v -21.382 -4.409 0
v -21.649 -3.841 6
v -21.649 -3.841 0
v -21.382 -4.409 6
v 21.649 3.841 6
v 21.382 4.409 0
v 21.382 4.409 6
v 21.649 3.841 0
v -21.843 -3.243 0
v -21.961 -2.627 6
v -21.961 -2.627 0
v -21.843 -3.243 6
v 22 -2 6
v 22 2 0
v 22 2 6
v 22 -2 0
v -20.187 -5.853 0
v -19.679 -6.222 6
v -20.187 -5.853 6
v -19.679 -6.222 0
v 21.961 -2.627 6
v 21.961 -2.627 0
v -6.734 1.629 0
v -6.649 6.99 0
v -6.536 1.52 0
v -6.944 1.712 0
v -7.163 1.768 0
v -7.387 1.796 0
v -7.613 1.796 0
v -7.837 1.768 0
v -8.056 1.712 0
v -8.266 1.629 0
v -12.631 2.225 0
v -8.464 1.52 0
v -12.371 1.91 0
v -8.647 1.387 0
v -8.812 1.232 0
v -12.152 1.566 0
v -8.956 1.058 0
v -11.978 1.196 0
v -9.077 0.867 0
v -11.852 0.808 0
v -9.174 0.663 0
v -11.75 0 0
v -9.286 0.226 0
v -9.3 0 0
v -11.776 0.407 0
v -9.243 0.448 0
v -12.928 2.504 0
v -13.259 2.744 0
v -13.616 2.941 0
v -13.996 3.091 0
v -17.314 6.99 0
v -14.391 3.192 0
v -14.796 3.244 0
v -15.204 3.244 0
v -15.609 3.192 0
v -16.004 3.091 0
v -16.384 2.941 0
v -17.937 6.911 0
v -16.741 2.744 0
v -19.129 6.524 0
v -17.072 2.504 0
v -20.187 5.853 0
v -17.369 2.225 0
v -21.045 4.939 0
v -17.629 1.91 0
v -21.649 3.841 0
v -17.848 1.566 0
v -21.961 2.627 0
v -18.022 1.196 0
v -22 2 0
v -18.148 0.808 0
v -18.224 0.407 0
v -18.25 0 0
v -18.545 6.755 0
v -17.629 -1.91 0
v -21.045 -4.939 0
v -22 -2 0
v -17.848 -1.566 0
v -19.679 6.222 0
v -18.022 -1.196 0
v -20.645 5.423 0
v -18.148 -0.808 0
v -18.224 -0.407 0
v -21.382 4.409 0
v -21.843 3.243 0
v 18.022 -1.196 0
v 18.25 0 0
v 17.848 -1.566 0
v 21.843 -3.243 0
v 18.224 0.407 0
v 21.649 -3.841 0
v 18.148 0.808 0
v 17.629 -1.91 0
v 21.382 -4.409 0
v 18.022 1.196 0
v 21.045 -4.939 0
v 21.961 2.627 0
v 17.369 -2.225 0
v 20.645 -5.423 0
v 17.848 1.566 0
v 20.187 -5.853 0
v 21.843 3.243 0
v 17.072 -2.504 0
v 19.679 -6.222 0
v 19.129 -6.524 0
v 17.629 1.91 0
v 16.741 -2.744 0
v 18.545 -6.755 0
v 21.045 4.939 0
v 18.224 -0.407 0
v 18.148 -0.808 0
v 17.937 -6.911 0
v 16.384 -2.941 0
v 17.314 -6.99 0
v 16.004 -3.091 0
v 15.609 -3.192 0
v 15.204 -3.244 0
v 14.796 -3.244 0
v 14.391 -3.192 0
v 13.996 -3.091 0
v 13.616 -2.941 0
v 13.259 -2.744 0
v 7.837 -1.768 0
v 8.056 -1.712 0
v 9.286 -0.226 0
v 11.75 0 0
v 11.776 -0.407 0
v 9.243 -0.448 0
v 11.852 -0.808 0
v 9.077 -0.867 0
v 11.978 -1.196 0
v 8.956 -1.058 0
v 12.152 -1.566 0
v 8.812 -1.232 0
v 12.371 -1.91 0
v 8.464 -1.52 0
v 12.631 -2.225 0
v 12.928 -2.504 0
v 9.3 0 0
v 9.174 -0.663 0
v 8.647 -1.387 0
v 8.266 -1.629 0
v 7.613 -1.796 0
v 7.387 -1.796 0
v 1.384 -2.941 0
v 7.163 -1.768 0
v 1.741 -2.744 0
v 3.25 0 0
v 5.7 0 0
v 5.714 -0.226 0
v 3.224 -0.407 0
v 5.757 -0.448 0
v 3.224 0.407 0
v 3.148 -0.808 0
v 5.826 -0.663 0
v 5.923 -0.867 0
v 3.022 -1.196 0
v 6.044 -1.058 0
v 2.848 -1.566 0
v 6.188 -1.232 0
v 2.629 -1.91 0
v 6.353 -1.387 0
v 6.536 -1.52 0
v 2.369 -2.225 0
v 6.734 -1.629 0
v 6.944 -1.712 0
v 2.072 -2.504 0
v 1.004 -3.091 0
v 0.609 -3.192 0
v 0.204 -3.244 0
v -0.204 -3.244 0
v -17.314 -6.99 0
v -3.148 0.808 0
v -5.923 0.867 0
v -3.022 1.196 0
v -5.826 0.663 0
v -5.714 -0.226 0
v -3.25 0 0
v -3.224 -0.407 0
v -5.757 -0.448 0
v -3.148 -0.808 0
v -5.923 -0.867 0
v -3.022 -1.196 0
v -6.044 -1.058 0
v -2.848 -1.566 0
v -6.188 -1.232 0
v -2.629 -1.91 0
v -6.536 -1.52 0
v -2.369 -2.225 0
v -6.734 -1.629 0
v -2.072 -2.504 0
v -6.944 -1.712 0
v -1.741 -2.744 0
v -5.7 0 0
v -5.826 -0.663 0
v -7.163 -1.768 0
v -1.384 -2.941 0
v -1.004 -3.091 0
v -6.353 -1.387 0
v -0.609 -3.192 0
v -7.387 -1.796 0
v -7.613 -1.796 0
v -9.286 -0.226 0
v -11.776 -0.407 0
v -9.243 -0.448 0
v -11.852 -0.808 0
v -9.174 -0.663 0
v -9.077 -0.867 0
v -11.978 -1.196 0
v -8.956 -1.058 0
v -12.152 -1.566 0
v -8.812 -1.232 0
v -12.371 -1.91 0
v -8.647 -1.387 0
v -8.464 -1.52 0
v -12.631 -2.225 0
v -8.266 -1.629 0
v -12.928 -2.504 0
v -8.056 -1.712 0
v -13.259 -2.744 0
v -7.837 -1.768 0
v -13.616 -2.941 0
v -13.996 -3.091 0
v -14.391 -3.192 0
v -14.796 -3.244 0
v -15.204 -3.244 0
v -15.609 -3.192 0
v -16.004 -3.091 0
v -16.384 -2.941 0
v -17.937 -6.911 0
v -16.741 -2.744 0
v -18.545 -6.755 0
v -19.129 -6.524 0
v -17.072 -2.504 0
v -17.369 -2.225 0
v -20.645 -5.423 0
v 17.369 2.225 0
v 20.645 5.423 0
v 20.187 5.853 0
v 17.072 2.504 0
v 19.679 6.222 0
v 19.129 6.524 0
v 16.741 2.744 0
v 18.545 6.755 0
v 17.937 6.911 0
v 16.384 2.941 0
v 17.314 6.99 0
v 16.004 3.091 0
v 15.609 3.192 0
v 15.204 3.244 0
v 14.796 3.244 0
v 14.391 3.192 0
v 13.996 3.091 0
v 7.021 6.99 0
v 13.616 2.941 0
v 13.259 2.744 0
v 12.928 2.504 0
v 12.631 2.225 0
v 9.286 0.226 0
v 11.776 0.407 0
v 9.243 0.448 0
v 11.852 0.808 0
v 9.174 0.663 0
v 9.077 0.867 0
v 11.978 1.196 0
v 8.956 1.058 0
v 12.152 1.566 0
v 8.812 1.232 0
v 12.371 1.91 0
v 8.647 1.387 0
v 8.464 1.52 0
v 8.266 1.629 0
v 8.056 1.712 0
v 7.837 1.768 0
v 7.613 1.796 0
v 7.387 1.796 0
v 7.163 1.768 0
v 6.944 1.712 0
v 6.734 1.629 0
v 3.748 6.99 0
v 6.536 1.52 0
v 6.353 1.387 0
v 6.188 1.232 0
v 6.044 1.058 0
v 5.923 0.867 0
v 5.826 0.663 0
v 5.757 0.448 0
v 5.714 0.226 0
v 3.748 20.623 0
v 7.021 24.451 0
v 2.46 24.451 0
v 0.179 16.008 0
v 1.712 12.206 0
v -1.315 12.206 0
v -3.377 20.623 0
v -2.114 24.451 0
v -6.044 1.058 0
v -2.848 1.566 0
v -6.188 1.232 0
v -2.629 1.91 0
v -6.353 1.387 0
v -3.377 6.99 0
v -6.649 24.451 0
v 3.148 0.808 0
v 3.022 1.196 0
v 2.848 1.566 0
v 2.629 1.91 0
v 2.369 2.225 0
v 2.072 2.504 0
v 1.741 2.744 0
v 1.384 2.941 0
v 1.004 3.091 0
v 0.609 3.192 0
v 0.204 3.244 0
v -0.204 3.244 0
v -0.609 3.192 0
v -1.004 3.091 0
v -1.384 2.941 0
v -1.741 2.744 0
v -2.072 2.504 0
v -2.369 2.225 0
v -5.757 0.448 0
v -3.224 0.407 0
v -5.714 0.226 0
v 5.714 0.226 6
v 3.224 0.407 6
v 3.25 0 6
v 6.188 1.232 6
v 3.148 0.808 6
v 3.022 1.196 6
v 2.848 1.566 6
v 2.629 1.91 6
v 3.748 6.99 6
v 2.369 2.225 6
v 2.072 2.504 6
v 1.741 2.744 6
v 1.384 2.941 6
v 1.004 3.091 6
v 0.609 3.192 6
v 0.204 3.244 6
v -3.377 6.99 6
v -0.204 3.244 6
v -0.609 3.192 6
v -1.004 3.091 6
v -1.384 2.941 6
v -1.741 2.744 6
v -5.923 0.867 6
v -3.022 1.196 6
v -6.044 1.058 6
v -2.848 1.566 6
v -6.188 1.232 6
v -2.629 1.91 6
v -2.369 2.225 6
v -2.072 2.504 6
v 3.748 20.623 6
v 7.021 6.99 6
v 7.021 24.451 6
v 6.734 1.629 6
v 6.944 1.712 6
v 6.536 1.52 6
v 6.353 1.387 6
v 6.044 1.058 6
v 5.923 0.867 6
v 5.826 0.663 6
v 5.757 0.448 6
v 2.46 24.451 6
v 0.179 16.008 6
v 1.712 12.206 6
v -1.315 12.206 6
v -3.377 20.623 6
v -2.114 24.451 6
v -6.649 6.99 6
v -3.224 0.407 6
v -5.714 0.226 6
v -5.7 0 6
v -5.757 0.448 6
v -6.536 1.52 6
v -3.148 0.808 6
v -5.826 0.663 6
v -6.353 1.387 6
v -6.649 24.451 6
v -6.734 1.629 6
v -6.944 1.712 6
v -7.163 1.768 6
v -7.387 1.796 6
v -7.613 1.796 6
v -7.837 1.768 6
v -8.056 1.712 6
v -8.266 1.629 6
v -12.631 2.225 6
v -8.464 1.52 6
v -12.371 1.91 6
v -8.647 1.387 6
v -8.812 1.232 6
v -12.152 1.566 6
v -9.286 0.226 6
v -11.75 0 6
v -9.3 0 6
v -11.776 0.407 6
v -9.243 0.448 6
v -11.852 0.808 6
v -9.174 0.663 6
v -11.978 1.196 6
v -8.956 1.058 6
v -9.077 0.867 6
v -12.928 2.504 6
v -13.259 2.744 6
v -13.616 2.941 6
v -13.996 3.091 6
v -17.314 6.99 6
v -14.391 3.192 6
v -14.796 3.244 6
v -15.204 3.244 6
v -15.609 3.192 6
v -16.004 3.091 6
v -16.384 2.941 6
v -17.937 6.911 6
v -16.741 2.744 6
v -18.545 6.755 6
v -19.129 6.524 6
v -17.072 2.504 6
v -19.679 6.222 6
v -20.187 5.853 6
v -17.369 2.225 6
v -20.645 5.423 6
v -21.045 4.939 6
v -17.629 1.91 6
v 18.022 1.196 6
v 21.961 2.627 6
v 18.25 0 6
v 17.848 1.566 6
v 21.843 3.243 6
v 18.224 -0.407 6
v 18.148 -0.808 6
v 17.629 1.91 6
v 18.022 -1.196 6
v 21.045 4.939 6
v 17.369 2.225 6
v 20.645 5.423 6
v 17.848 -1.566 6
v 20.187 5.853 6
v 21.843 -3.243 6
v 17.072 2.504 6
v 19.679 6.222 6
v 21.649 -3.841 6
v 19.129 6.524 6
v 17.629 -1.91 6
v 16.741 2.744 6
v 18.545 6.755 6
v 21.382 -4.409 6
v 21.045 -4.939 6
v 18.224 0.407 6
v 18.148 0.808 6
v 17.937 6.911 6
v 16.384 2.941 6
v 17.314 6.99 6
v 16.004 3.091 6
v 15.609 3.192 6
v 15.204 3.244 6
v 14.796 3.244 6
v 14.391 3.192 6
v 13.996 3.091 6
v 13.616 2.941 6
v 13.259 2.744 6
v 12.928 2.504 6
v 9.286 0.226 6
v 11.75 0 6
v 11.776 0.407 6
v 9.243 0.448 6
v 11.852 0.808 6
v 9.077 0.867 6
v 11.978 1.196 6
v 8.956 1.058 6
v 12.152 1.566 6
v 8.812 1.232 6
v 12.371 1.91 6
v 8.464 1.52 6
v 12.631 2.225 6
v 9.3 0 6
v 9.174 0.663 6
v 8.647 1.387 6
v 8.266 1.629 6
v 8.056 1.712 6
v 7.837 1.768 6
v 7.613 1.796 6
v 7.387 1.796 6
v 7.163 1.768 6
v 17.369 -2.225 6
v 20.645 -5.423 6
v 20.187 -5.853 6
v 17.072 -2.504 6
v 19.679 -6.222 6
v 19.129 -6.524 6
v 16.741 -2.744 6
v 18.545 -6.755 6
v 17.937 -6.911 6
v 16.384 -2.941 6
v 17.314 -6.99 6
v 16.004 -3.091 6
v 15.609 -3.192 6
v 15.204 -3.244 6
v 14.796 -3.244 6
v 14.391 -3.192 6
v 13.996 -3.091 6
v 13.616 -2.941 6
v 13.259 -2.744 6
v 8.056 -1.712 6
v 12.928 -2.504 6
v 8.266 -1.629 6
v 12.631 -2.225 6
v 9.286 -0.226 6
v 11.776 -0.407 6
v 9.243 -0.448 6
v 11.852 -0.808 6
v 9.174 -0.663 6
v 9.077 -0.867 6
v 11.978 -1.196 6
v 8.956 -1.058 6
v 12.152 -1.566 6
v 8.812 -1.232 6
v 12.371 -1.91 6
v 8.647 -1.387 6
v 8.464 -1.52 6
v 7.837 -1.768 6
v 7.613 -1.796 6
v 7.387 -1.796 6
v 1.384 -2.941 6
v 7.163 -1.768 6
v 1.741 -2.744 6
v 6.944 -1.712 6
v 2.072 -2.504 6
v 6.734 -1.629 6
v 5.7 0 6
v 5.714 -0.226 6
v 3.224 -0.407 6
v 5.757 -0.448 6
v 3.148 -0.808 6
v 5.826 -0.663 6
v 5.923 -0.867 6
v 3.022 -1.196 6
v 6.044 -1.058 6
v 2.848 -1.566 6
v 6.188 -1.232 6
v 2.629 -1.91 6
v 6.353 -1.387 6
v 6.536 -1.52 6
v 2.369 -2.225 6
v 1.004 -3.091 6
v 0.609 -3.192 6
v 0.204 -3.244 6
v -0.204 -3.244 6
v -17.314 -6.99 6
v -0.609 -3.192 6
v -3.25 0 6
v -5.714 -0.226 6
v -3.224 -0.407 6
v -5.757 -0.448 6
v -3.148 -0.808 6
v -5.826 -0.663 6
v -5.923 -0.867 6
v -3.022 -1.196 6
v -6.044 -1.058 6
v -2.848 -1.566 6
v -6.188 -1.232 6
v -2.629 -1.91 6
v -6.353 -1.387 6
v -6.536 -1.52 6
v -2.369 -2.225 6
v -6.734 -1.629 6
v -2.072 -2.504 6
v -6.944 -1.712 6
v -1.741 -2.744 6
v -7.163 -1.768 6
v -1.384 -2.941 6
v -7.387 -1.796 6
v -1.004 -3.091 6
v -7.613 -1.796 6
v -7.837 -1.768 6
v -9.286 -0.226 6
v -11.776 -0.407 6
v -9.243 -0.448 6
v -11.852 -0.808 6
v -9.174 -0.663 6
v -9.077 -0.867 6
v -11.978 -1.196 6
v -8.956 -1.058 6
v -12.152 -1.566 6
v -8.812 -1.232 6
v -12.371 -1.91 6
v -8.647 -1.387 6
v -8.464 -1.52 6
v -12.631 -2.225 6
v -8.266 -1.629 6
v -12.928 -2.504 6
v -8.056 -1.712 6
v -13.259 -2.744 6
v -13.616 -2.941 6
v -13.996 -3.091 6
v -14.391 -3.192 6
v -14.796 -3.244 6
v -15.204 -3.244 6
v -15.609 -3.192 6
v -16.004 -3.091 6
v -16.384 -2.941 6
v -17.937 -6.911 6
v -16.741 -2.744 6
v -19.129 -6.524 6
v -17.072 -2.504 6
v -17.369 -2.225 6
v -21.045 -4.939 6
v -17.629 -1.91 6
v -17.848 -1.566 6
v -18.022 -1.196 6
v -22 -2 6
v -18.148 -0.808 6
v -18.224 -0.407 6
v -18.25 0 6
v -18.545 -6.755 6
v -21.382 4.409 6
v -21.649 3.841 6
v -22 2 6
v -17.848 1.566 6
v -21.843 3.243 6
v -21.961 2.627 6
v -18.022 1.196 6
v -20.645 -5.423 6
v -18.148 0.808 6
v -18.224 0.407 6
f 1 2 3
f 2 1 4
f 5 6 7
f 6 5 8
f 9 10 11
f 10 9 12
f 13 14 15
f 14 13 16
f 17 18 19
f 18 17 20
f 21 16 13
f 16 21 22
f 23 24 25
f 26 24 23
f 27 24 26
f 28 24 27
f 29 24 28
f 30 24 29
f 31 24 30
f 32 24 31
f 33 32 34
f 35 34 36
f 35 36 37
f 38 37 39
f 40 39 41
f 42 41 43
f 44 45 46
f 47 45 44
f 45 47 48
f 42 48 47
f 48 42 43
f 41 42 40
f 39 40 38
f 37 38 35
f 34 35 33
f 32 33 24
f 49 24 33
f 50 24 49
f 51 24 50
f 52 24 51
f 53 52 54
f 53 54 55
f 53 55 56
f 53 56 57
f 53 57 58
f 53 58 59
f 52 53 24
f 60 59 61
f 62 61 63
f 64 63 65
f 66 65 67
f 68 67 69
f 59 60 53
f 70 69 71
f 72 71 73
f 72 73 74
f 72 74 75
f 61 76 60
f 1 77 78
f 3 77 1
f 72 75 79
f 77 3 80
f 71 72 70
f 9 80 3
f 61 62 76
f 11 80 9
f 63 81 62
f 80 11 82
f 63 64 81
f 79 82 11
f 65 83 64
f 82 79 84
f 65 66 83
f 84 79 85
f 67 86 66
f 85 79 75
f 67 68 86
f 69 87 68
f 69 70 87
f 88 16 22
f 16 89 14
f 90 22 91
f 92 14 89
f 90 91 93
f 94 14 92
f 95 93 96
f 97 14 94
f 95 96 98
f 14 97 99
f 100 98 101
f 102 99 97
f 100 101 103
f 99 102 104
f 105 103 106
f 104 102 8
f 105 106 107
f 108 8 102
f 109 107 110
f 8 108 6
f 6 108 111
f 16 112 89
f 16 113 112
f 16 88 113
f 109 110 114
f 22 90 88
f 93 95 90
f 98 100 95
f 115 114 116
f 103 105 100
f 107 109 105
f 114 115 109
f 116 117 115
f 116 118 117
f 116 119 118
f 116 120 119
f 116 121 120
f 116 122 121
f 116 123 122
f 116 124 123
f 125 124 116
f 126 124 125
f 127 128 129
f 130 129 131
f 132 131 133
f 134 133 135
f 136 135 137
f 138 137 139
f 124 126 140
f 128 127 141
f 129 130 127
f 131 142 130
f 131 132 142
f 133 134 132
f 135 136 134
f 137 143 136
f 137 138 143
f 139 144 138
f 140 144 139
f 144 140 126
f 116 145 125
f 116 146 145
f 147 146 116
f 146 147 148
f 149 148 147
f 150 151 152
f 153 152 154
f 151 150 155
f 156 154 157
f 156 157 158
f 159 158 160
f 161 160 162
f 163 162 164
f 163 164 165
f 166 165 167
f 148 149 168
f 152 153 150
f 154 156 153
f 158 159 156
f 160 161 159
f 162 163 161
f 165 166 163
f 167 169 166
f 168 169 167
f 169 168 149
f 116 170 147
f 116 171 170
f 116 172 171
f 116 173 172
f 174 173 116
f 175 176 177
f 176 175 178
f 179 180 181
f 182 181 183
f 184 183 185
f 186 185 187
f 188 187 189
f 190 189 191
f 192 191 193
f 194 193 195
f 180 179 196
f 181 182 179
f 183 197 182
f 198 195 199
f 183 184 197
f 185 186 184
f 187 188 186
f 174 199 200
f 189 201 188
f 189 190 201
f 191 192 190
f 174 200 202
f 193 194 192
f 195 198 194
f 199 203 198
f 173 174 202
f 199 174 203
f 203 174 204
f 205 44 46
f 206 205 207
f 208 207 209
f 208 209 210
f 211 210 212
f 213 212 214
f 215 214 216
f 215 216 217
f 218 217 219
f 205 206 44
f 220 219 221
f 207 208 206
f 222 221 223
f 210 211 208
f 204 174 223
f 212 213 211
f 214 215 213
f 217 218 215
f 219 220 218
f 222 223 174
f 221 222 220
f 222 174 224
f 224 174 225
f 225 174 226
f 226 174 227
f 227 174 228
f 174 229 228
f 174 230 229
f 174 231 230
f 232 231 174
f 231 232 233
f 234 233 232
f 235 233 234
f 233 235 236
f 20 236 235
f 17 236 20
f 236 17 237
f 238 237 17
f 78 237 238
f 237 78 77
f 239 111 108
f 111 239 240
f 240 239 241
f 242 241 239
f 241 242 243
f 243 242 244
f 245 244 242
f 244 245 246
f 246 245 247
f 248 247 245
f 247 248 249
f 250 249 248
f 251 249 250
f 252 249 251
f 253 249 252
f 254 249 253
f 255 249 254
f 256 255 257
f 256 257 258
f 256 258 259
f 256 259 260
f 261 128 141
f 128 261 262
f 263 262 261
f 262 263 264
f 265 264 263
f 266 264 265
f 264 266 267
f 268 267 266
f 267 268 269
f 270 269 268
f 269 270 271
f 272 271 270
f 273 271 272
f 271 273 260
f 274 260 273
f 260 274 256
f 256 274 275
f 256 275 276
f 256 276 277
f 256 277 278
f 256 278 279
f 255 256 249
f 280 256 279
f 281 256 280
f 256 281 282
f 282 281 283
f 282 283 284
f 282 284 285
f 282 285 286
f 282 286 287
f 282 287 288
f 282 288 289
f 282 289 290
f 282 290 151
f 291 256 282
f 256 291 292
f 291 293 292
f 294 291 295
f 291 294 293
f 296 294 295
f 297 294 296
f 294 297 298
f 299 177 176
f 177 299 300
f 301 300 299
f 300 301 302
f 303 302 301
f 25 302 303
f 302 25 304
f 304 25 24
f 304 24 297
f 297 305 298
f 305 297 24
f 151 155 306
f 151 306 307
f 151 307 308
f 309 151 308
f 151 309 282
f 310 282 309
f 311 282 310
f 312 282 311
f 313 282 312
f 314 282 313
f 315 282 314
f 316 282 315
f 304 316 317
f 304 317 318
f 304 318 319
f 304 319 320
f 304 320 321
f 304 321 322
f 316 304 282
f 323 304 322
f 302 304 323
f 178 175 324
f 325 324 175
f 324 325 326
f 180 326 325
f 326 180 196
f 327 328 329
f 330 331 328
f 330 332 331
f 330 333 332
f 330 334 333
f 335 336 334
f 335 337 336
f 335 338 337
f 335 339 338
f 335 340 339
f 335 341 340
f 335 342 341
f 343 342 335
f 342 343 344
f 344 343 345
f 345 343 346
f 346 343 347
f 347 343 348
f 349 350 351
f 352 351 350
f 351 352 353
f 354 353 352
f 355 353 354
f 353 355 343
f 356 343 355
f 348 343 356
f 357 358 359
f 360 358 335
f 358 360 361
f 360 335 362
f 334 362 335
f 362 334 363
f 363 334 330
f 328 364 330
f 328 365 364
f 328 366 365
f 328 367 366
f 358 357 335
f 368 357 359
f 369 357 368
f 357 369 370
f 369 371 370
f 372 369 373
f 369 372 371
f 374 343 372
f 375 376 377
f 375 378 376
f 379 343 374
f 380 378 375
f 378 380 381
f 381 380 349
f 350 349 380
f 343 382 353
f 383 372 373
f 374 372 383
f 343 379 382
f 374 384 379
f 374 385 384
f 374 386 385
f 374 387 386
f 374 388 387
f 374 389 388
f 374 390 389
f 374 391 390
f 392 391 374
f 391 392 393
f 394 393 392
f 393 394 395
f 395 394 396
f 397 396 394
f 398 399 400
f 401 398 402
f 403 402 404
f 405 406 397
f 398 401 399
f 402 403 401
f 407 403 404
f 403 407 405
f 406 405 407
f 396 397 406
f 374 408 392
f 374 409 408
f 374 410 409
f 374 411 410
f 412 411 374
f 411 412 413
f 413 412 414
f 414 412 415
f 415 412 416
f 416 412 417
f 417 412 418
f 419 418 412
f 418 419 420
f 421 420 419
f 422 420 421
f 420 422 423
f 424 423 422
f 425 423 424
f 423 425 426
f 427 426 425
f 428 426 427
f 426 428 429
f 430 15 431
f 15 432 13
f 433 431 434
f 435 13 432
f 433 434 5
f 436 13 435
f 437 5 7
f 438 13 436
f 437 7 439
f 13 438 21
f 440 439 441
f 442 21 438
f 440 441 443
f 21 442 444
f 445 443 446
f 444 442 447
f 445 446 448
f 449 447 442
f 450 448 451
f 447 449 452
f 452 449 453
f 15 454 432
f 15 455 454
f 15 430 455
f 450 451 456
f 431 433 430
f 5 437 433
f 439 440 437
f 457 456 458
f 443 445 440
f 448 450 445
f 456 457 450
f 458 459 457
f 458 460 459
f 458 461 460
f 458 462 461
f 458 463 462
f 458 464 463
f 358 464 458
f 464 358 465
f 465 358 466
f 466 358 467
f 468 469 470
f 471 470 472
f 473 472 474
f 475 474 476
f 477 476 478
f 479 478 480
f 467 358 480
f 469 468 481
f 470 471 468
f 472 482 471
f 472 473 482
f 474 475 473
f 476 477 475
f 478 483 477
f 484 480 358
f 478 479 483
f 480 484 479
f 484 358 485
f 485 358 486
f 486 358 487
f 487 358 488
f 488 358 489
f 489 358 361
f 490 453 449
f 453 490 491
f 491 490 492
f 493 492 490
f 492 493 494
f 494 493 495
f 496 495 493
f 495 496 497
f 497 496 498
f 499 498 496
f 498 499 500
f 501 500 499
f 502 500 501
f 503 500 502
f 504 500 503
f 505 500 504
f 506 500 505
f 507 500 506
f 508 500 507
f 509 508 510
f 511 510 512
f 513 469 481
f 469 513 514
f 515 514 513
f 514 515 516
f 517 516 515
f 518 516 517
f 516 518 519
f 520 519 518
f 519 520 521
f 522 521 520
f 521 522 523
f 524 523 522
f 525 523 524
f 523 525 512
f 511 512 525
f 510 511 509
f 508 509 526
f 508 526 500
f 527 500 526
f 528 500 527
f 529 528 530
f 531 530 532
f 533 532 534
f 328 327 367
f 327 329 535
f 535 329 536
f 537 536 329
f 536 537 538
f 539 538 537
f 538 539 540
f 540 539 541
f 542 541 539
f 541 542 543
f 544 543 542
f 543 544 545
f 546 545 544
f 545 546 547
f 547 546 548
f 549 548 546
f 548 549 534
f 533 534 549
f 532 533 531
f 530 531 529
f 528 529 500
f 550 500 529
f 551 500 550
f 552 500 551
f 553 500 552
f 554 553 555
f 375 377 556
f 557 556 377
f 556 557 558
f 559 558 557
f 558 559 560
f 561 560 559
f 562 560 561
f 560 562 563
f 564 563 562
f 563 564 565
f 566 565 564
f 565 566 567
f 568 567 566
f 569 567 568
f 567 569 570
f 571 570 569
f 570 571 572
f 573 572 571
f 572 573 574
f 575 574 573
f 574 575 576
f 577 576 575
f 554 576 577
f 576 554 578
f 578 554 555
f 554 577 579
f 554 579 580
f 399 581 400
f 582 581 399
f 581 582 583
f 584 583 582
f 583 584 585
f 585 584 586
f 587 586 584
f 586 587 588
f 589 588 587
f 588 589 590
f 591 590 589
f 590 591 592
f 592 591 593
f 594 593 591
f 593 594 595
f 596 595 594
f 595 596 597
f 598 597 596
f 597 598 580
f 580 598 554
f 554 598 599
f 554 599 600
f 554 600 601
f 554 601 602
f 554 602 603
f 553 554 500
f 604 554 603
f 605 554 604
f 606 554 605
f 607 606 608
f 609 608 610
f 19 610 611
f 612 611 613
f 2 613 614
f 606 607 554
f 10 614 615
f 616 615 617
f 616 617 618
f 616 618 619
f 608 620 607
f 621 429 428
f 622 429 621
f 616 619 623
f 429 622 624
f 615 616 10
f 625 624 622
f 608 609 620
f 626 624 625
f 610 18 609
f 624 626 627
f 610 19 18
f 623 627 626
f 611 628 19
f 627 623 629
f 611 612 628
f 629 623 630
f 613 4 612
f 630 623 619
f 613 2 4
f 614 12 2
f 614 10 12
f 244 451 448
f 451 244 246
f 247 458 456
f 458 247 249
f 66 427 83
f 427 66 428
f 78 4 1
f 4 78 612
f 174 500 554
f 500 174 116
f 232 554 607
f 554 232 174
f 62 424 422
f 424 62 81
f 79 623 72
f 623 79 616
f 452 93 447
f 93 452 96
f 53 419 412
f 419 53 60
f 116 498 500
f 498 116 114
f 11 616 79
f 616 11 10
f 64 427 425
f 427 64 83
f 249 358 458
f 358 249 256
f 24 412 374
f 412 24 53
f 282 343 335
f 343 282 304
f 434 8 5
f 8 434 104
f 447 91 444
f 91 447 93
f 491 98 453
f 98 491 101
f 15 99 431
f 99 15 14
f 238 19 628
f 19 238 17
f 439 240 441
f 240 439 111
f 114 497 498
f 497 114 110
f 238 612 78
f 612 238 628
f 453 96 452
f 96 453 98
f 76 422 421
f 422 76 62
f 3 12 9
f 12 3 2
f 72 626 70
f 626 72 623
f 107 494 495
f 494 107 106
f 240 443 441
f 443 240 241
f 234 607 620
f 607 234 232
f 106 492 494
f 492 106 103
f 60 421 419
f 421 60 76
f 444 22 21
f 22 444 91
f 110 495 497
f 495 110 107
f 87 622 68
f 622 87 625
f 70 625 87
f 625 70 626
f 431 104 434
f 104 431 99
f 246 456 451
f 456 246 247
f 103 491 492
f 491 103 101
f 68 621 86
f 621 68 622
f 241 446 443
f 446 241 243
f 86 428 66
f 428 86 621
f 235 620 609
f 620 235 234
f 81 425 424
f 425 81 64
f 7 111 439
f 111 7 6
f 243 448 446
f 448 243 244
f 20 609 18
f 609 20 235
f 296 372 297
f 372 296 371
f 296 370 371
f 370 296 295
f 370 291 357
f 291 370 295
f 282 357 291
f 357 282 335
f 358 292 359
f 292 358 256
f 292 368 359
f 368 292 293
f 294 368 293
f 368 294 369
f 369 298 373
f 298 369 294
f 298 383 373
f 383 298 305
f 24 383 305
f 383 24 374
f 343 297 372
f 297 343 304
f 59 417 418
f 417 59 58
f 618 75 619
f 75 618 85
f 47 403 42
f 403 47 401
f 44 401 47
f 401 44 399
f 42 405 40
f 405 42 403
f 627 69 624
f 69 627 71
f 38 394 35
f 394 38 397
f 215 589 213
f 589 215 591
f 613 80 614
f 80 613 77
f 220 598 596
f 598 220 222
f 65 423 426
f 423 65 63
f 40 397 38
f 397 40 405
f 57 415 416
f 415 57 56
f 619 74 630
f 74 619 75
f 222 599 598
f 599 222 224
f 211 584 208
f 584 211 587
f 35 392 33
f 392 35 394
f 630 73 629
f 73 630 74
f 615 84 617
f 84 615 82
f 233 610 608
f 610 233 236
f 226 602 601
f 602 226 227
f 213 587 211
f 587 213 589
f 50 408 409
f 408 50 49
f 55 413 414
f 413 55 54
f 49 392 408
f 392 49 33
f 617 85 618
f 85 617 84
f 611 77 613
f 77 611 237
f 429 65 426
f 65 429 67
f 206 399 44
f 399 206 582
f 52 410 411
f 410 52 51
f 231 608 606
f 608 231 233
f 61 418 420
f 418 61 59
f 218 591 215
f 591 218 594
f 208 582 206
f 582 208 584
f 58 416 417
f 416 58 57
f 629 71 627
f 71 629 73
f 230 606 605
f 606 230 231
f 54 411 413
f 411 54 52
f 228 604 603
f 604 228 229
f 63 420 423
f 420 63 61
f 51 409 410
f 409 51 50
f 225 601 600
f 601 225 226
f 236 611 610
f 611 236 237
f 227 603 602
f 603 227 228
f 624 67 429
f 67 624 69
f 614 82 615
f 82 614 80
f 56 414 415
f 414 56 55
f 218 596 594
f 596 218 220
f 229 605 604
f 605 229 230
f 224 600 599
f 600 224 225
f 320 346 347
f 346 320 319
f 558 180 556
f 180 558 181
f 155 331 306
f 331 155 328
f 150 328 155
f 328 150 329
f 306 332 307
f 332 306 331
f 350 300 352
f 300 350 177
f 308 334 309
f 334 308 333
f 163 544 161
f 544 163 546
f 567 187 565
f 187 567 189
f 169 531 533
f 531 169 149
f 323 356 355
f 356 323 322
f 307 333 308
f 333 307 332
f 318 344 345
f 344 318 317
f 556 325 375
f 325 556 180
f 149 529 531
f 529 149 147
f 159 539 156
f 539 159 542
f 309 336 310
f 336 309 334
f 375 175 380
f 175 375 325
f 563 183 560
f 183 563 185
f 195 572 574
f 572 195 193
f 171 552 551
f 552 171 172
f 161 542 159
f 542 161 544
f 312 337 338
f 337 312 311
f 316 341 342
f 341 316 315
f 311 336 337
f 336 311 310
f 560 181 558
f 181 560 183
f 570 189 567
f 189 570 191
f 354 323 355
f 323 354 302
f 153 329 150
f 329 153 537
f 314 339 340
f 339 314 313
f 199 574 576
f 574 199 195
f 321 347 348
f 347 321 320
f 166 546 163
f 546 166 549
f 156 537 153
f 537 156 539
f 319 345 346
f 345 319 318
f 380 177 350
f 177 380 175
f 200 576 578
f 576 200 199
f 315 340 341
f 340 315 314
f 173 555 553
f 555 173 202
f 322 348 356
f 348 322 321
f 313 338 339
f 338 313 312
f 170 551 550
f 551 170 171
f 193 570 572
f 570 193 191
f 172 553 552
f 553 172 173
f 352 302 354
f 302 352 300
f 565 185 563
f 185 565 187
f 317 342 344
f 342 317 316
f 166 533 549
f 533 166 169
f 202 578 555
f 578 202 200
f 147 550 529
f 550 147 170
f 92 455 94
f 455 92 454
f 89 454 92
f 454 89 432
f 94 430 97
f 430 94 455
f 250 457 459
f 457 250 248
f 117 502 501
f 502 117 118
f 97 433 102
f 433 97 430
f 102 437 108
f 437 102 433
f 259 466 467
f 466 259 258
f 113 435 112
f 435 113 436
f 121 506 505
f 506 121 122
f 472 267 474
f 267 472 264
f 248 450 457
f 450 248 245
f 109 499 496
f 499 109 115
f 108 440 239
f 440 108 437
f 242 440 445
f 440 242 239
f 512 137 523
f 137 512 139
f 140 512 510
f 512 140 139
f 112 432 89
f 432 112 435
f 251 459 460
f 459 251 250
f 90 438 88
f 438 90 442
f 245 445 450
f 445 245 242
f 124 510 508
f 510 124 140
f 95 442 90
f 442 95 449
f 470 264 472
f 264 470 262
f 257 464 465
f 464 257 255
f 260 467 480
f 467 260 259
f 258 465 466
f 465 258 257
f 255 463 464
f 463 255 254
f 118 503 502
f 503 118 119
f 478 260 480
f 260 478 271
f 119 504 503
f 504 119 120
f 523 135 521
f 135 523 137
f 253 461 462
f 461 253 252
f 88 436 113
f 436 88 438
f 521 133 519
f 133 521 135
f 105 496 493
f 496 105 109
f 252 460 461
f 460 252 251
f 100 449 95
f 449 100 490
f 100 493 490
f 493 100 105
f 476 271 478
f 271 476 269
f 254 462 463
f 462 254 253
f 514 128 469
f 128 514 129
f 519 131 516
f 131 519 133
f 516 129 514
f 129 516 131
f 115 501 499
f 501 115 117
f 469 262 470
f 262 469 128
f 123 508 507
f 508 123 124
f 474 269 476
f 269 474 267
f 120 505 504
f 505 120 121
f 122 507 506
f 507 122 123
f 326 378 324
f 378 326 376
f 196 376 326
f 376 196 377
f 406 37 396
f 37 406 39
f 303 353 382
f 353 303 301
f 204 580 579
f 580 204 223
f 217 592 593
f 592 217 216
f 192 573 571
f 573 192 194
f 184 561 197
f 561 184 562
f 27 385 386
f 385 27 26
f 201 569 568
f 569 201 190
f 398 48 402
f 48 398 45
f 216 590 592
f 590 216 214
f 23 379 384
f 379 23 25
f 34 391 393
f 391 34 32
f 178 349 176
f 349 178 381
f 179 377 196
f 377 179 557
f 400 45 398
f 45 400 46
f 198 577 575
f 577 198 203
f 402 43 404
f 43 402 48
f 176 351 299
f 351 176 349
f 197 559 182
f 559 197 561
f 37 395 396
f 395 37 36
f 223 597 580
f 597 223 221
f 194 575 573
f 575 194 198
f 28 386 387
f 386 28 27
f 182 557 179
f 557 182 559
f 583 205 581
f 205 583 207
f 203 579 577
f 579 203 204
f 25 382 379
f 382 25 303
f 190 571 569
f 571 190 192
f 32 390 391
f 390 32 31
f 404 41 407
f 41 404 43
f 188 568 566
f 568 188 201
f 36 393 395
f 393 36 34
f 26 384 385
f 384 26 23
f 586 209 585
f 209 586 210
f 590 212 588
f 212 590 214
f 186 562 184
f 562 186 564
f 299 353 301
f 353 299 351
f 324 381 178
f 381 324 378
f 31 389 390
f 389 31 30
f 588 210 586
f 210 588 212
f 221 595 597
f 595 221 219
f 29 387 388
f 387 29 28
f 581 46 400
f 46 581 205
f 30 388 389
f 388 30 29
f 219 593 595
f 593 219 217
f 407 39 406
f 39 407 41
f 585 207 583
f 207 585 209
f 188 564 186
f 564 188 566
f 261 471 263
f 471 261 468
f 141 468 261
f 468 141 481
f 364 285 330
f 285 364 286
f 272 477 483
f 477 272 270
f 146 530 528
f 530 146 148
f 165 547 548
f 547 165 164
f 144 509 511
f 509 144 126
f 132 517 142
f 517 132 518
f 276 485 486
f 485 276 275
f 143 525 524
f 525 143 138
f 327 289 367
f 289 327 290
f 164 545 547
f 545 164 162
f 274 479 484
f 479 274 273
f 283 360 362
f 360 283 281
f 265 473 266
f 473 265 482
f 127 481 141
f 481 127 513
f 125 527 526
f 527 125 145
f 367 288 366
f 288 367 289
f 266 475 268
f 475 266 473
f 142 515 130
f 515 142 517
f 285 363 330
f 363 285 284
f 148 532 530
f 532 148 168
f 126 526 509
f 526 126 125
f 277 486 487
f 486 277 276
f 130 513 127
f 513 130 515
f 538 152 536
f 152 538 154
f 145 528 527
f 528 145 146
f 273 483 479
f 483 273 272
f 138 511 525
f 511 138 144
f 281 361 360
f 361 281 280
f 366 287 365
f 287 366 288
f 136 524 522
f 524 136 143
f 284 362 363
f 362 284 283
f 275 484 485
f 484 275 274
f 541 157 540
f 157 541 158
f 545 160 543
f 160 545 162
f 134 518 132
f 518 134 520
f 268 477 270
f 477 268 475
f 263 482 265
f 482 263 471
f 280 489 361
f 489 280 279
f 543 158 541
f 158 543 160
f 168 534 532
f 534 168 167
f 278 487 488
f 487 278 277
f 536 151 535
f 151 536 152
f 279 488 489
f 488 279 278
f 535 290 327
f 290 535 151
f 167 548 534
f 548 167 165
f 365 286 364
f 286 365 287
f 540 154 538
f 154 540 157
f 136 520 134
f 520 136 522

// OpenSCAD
$fn = 50;


difference() {
	union() {
		hull() {
			translate(v = [-17.0000000000, 2.0000000000, 0]) {
				cylinder(h = 6, r = 5);
			}
			translate(v = [17.0000000000, 2.0000000000, 0]) {
				cylinder(h = 6, r = 5);
			}
			translate(v = [-17.0000000000, -2.0000000000, 0]) {
				cylinder(h = 6, r = 5);
			}
			translate(v = [17.0000000000, -2.0000000000, 0]) {
				cylinder(h = 6, r = 5);
			}
		}
		translate(v = [0, 24, 0]) {
			linear_extrude(height = 6) {
				text(font = "DejaVu Sans Mono:style=Bold", halign = "center", size = 19.0000000000, text = "M", valign = "top");
			}
		}
	}
	union() {
		translate(v = [-15.0000000000, 0.0000000000, 0]) {
			translate(v = [0, 0, -100]) {
				cylinder(h = 200, r = 3.2500000000);
			}
		}
		translate(v = [0, 0, -100]) {
			cylinder(h = 200, r = 3.2500000000);
		}
		translate(v = [15.0000000000, 0.0000000000, 0]) {
			translate(v = [0, 0, -100]) {
				cylinder(h = 200, r = 3.2500000000);
			}
		}
		translate(v = [-15.0000000000, 0.0000000000, 0]) {
			translate(v = [0, 0, -100]) {
				cylinder(h = 200, r = 1.8000000000);
			}
		}
		translate(v = [-7.5000000000, 0.0000000000, 0]) {
			translate(v = [0, 0, -100]) {
				cylinder(h = 200, r = 1.8000000000);
			}
		}
		translate(v = [0, 0, -100]) {
			cylinder(h = 200, r = 1.8000000000);
		}
		translate(v = [7.5000000000, 0.0000000000, 0]) {
			translate(v = [0, 0, -100]) {
				cylinder(h = 200, r = 1.8000000000);
			}
		}
		translate(v = [15.0000000000, 0.0000000000, 0]) {
			translate(v = [0, 0, -100]) {
				cylinder(h = 200, r = 1.8000000000);
			}
		}
	}
}
